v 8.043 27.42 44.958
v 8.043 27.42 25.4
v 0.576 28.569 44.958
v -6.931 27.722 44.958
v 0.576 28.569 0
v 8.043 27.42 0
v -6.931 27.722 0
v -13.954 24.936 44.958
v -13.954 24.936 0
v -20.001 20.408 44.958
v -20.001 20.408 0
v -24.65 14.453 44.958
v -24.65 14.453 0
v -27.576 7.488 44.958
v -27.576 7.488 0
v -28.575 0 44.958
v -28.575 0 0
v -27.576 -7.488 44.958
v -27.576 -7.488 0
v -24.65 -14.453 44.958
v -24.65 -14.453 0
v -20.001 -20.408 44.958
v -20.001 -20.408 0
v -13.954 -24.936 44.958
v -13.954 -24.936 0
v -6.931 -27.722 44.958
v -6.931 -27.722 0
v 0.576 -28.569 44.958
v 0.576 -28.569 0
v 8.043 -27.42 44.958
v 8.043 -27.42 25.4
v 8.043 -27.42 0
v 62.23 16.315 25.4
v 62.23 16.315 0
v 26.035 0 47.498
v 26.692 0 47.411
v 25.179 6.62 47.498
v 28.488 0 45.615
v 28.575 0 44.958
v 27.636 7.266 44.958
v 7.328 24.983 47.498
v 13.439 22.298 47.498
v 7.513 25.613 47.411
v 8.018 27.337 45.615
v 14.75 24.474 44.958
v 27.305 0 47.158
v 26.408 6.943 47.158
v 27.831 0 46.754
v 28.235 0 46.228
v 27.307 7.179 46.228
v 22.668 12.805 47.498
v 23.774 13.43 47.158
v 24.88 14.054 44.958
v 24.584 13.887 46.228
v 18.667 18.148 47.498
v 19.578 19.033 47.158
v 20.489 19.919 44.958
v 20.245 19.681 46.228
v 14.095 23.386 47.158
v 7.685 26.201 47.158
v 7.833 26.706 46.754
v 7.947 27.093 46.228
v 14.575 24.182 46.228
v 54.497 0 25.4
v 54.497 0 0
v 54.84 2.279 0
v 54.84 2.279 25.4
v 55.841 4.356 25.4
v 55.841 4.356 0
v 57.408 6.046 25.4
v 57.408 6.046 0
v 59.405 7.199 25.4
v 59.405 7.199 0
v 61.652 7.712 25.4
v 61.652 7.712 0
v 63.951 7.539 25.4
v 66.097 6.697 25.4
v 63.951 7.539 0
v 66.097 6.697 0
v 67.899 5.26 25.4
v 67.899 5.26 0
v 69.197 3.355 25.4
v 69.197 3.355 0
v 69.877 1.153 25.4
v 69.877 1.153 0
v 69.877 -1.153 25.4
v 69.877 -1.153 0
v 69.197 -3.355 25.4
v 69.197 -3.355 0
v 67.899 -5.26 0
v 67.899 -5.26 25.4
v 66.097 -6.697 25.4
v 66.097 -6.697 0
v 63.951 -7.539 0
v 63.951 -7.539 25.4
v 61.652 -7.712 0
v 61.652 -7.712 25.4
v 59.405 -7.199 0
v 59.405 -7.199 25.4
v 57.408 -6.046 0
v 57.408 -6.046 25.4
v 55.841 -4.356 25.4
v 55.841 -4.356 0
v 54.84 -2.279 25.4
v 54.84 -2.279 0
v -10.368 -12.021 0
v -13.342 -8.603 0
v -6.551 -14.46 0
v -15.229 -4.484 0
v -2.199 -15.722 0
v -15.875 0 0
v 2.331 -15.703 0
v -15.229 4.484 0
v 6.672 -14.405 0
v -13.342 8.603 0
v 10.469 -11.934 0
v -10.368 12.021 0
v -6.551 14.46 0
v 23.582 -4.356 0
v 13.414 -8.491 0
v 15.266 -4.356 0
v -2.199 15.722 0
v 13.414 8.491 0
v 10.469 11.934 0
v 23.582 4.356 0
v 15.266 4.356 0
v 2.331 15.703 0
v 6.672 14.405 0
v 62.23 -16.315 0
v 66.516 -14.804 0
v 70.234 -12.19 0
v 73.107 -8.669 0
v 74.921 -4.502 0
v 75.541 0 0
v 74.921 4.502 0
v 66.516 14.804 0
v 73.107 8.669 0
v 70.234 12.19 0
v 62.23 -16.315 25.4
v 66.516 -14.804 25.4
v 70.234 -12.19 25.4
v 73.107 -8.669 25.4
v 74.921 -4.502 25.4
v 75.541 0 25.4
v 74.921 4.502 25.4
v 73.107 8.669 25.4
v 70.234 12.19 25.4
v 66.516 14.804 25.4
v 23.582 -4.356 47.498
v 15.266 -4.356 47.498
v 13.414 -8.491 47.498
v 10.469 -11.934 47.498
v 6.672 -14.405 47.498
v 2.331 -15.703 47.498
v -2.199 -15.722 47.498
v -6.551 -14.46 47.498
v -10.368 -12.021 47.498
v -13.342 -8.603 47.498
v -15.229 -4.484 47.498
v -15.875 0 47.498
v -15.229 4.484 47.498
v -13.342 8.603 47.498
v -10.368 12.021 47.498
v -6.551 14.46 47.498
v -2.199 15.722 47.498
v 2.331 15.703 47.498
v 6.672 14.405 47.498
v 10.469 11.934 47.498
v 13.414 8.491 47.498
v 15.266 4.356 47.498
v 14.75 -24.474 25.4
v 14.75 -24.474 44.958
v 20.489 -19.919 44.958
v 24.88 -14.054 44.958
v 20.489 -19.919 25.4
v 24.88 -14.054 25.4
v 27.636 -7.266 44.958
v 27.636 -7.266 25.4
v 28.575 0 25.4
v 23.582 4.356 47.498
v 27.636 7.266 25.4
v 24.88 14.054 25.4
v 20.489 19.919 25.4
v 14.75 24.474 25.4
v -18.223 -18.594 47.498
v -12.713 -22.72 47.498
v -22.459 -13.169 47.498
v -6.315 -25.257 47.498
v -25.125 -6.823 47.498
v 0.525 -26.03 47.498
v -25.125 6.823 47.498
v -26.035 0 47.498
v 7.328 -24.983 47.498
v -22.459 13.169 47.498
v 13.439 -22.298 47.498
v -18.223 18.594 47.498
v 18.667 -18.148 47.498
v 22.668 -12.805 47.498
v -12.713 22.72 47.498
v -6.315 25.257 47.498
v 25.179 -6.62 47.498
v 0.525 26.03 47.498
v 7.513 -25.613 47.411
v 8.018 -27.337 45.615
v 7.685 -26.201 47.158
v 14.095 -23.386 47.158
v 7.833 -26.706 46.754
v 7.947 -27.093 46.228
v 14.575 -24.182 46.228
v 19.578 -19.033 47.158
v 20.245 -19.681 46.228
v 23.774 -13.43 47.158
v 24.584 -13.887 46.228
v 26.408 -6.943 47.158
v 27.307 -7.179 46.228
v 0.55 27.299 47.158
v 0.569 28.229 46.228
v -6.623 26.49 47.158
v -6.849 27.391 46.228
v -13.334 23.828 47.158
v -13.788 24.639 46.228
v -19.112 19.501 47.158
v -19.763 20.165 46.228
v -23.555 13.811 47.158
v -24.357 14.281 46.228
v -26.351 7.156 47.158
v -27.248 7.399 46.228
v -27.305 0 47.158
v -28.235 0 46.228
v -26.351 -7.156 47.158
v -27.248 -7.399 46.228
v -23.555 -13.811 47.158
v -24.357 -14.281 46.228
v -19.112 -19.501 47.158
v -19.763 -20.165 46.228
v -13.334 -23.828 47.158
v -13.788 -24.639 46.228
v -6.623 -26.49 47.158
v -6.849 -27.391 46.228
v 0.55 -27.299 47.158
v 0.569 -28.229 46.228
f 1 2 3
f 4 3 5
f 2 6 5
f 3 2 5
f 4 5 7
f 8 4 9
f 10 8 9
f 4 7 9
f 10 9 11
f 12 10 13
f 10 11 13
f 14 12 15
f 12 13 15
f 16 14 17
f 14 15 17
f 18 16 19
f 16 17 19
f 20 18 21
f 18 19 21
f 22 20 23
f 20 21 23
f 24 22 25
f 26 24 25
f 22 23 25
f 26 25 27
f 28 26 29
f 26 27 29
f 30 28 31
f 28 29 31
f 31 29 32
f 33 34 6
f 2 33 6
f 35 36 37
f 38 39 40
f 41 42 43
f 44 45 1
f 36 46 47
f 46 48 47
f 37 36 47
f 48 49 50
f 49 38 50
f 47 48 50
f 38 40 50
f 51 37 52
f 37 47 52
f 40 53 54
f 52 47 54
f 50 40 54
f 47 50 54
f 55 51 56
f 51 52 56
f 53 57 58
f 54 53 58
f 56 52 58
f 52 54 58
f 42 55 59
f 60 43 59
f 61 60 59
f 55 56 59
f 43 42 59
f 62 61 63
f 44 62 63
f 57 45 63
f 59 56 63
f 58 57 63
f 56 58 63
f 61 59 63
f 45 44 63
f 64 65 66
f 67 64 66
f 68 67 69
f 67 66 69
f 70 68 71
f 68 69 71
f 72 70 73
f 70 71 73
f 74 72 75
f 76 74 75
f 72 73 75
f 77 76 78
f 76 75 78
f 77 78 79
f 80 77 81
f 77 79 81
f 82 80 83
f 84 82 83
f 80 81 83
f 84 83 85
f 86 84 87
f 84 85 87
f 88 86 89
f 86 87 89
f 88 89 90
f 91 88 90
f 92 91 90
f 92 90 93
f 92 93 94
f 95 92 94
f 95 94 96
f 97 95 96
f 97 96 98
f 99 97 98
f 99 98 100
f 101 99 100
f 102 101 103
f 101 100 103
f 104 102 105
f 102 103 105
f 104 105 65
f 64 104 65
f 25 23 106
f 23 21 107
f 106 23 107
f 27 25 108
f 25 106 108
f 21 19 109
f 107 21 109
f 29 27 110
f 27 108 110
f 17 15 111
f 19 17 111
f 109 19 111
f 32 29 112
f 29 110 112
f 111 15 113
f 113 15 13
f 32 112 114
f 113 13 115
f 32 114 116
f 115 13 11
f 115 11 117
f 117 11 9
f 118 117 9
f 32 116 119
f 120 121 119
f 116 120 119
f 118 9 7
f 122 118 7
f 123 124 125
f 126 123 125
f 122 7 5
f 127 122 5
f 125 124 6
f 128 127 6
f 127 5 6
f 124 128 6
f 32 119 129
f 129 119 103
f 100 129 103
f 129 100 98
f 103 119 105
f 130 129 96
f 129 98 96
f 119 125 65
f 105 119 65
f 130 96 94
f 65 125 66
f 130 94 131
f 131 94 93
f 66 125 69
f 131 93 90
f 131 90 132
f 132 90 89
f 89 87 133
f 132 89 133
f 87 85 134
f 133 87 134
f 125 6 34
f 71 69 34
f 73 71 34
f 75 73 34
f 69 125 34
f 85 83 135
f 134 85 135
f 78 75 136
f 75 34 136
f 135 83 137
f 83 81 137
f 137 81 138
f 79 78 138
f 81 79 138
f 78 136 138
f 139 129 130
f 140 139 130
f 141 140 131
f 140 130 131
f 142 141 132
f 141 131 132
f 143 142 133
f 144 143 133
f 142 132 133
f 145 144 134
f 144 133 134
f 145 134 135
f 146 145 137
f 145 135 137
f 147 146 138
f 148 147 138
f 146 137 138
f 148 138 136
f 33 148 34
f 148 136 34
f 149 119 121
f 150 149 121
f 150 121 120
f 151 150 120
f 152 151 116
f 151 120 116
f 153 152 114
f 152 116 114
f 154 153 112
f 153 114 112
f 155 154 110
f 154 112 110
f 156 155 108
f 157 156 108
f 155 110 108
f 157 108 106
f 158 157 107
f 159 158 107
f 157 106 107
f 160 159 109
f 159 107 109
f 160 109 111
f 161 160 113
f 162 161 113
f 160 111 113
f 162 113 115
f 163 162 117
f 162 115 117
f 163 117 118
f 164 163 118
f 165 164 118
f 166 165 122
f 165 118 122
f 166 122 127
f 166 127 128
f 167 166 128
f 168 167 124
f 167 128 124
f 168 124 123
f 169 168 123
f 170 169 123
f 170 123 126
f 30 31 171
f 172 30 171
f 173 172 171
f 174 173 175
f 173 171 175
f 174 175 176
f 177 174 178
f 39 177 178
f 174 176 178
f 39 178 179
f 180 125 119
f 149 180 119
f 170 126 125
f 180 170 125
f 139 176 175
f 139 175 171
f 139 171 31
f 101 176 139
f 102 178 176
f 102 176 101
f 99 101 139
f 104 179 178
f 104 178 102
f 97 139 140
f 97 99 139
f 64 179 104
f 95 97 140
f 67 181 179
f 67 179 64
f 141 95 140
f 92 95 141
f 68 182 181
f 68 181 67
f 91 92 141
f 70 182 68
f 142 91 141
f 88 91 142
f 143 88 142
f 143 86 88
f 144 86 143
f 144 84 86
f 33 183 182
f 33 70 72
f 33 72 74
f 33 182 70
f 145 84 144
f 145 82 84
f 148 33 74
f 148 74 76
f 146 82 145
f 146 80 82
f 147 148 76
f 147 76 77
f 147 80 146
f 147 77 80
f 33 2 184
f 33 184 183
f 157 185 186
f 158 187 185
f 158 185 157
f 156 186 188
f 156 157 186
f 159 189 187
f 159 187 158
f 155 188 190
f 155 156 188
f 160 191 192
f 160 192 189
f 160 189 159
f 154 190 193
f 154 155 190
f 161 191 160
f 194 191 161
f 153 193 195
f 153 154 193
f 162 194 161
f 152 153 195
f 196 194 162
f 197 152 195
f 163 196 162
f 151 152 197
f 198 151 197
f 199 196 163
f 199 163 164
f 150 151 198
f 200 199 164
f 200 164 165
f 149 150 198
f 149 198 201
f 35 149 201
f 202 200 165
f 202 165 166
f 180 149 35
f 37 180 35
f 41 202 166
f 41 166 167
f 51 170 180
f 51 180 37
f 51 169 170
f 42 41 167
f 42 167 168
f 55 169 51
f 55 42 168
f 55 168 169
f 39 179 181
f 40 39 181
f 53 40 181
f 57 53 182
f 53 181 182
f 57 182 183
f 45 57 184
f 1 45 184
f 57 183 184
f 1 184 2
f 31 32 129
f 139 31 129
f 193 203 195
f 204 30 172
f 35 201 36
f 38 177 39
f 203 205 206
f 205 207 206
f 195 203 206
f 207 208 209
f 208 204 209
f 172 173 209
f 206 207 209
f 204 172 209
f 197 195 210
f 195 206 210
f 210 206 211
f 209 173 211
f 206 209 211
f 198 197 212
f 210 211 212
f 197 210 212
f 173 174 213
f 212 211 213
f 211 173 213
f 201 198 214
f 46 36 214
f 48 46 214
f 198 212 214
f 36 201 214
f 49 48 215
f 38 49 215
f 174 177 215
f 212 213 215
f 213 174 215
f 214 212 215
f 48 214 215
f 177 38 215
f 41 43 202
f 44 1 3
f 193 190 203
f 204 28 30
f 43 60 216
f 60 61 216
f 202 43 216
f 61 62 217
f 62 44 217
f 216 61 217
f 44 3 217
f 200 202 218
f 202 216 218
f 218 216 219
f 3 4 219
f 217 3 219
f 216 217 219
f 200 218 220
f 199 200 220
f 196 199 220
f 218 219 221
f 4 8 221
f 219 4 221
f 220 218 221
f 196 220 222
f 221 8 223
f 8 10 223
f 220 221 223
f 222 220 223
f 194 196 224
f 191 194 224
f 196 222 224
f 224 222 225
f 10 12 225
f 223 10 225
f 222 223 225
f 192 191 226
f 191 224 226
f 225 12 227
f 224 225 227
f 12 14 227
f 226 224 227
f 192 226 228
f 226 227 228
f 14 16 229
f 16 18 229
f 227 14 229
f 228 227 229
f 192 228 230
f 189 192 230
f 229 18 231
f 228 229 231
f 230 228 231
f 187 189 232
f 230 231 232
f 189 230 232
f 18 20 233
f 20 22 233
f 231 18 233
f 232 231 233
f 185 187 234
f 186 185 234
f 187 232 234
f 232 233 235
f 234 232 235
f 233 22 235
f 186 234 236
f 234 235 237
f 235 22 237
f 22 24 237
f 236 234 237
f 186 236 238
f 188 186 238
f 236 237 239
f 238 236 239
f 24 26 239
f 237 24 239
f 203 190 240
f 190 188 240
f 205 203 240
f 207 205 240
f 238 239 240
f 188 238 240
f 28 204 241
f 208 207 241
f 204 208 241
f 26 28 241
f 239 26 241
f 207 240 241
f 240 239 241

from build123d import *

# Parameters (mm, degrees)
F1_DEPTH = 25.4
F2_DEPTH = 47.498
F3_R     = 2.54


with BuildPart() as f1:
    # F0 (on Top) → F1 (new body)
    with BuildSketch(Plane.XY):
        with BuildLine():
            ThreePointArc((8.0425684433, 27.4198416814), (22.8729864498, 17.1276710579), (28.575, 0))
            ThreePointArc((28.575, 0), (22.8729864498, -17.1276710579), (8.0425684433, -27.4198416814))
            Line((8.0425684433, -27.4198416814), (62.23, -16.3154043257))
            ThreePointArc((62.23, -16.3154043257), (75.5410049965, 0), (62.23, 16.3154043257))
            Line((62.23, 16.3154043257), (8.0425684433, 27.4198416814))
        make_face()
        with BuildLine():
            ThreePointArc((69.9632073706, 0), (62.23, -7.7332073706), (54.4967926294, 0))
            ThreePointArc((54.4967926294, 0), (62.23, 7.7332073706), (69.9632073706, 0))
        make_face(mode=Mode.SUBTRACT)
    extrude(amount=F1_DEPTH)

    # F0 (on Top) → F2 (join)
    with BuildSketch(Plane.XY):
        with BuildLine():
            ThreePointArc((8.0425684433, -27.4198416814), (22.8729864498, -17.1276710579), (28.575, 0))
            ThreePointArc((28.575, 0), (22.8729864498, 17.1276710579), (8.0425684433, 27.4198416814))
            ThreePointArc((8.0425684433, 27.4198416814), (-28.575, 0), (8.0425684433, -27.4198416814))
        make_face()
        with BuildLine():
            Line((23.5818270594, 4.3561793864), (23.5818270594, 0))
            Line((23.5818270594, 0), (23.5818270594, -4.3561793864))
            Line((23.5818270594, -4.3561793864), (15.2656256391, -4.3561793864))
            ThreePointArc((15.2656256391, -4.3561793864), (-15.875, 0), (15.2656256391, 4.3561793864))
            Line((15.2656256391, 4.3561793864), (23.5818270594, 4.3561793864))
        make_face(mode=Mode.SUBTRACT)
    extrude(amount=F2_DEPTH)

    # F3
    f3_edges = [f1.edges().sort_by_distance(p)[0] for p in [
        (-8.042568, 27.419842, 47.498),
    ]]
    fillet(f3_edges, radius=F3_R)


solid = f1.part
